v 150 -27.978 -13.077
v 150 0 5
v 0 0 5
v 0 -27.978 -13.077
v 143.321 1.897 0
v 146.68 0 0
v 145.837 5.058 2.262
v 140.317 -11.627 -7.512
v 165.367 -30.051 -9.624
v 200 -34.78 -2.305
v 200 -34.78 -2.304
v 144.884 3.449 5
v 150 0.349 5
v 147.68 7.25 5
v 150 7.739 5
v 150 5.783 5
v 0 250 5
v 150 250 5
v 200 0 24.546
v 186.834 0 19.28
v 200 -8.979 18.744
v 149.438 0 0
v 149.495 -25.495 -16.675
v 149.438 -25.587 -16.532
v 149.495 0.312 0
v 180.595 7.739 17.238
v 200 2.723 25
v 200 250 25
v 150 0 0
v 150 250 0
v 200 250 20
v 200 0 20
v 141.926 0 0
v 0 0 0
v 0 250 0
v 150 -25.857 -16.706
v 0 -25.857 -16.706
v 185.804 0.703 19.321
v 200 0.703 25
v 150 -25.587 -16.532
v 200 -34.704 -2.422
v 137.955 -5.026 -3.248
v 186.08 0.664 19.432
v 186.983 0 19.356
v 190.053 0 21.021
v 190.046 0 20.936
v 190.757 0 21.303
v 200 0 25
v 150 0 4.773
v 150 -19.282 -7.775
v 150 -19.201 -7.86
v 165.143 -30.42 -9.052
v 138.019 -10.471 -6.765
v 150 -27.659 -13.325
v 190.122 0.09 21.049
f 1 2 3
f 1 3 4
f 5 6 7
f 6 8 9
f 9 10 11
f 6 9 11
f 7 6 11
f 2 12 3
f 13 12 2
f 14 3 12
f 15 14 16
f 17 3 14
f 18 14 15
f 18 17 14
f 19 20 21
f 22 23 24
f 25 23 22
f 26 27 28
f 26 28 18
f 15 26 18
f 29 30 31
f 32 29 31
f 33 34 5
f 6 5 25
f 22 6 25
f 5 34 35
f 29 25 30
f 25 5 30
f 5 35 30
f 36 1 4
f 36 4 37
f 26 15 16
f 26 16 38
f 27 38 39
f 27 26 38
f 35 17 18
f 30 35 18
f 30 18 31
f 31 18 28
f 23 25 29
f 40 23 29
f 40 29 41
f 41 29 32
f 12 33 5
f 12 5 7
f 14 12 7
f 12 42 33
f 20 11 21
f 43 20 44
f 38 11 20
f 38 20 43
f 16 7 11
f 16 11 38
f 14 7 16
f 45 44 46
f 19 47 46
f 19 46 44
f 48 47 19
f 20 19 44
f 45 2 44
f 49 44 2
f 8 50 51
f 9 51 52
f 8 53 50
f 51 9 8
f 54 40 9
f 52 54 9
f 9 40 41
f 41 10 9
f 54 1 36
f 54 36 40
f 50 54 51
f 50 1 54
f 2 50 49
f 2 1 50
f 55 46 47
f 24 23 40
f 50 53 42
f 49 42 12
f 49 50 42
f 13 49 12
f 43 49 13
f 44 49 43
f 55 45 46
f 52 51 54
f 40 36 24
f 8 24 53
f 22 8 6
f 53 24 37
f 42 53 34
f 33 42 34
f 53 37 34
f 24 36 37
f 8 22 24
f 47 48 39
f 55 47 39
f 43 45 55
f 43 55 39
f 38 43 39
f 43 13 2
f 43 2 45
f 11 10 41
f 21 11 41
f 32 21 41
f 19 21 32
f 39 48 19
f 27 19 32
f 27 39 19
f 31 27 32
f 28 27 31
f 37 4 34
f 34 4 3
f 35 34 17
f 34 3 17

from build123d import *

# Parameters (mm, degrees)
F0_W      = 150
F0_H      = 250
F1_DEPTH  = 5
F3_DEPTH  = 150
F5_DEPTH  = 250
F7_W      = 58.9762479067
F7_H      = 46.3181659579
F8_DEPTH  = 3.61943
F9_W      = 66.3050051284
F9_H      = 23.7932279706
F10_DEPTH = 25
F11_W     = 9.7743958235
F11_H     = 36.3947637379
F12_DEPTH = 25
F13_W     = 91.9819101691
F13_H     = 53.4567786381
F14_DEPTH = 25
F17_DEPTH = 42.79442
F18_DEPTH = 37.25584


with BuildPart() as f1:
    # F0 (on Top) → F1 (new body)
    with BuildSketch(Plane.XY):
        with Locations((75, 125)):
            Rectangle(F0_W, F0_H)
    extrude(amount=F1_DEPTH)

    # F2 (on Right) → F3 (join)
    with BuildSketch(Plane.YZ):
        Polygon((-25.8566159755, -16.7061649263), (0, 0), (0, 5), (-27.978492185, -13.0771259965), align=None)
    extrude(amount=F3_DEPTH)

    # F4 (on Front) → F5 (join)
    with BuildSketch(Plane.XZ):
        Polygon((150, 5), (150, 0), (200, 20), (200, 25), align=None)
    extrude(amount=-F5_DEPTH)

    # F7 (on 3pt) → F8 (join)
    with BuildSketch(Plane(origin=(15.2143755699, 24.5753222078, -38.0359389247), x_dir=(0.9479297598, -0.1728350436, 0.2675018096), z_dir=(-0.3184794663, -0.5144302811, 0.7961986658))):
        with Locations((171.1452230811, -7.3043461889)):
            Rectangle(F7_W, F7_H)
    extrude(amount=F8_DEPTH)

    # F9 (on face) → F10 (cut)
    with BuildSketch(Plane(origin=(18.9655172414, 0, -47.4137931034), x_dir=(0.9284766909, 0, 0.3713906764), z_dir=(-0.3713906764, 0, 0.9284766909))):
        with Locations((174.2809595788, 11.8966139853)):
            Rectangle(F9_W, F9_H)
    extrude(amount=F10_DEPTH, mode=Mode.SUBTRACT)

    # F11 (on face) → F12 (cut)
    with BuildSketch(Plane.XY.offset(5)):
        with Locations((145.1128020883, 18.197381869)):
            Rectangle(F11_W, F11_H)
    extrude(amount=F12_DEPTH, mode=Mode.SUBTRACT)

    # F13 (on face) → F14 (cut)
    with BuildSketch(Plane.YZ.offset(200)):
        with Locations((-13.2915489376, 13.6362598278)):
            Rectangle(F13_W, F13_H)
    extrude(amount=F14_DEPTH, mode=Mode.SUBTRACT)

    # F16 (on face) → F17 (cut)
    with BuildSketch(Plane(origin=(121.6211489037, -89.4544048238, -10.2533341545), x_dir=(0.5890555913, 0.8065651439, -0.0496606377), z_dir=(0.8037140341, -0.5911452179, -0.0677575293))):
        Polygon((66.8091401458, 0), (89.8736044765, 14.5051842555), (116.4209321141, 42.6778681576), align=None)
    extrude(amount=F17_DEPTH, mode=Mode.SUBTRACT)

    # F18 (cut): a face of the model
    f18_faces = [f1.faces().sort_by_distance(p)[0] for p in [
        (175.9683447832, -17.0287264276, 2.5203105636),
    ]]
    extrude(f18_faces, amount=-F18_DEPTH, mode=Mode.SUBTRACT)


solid = f1.part
